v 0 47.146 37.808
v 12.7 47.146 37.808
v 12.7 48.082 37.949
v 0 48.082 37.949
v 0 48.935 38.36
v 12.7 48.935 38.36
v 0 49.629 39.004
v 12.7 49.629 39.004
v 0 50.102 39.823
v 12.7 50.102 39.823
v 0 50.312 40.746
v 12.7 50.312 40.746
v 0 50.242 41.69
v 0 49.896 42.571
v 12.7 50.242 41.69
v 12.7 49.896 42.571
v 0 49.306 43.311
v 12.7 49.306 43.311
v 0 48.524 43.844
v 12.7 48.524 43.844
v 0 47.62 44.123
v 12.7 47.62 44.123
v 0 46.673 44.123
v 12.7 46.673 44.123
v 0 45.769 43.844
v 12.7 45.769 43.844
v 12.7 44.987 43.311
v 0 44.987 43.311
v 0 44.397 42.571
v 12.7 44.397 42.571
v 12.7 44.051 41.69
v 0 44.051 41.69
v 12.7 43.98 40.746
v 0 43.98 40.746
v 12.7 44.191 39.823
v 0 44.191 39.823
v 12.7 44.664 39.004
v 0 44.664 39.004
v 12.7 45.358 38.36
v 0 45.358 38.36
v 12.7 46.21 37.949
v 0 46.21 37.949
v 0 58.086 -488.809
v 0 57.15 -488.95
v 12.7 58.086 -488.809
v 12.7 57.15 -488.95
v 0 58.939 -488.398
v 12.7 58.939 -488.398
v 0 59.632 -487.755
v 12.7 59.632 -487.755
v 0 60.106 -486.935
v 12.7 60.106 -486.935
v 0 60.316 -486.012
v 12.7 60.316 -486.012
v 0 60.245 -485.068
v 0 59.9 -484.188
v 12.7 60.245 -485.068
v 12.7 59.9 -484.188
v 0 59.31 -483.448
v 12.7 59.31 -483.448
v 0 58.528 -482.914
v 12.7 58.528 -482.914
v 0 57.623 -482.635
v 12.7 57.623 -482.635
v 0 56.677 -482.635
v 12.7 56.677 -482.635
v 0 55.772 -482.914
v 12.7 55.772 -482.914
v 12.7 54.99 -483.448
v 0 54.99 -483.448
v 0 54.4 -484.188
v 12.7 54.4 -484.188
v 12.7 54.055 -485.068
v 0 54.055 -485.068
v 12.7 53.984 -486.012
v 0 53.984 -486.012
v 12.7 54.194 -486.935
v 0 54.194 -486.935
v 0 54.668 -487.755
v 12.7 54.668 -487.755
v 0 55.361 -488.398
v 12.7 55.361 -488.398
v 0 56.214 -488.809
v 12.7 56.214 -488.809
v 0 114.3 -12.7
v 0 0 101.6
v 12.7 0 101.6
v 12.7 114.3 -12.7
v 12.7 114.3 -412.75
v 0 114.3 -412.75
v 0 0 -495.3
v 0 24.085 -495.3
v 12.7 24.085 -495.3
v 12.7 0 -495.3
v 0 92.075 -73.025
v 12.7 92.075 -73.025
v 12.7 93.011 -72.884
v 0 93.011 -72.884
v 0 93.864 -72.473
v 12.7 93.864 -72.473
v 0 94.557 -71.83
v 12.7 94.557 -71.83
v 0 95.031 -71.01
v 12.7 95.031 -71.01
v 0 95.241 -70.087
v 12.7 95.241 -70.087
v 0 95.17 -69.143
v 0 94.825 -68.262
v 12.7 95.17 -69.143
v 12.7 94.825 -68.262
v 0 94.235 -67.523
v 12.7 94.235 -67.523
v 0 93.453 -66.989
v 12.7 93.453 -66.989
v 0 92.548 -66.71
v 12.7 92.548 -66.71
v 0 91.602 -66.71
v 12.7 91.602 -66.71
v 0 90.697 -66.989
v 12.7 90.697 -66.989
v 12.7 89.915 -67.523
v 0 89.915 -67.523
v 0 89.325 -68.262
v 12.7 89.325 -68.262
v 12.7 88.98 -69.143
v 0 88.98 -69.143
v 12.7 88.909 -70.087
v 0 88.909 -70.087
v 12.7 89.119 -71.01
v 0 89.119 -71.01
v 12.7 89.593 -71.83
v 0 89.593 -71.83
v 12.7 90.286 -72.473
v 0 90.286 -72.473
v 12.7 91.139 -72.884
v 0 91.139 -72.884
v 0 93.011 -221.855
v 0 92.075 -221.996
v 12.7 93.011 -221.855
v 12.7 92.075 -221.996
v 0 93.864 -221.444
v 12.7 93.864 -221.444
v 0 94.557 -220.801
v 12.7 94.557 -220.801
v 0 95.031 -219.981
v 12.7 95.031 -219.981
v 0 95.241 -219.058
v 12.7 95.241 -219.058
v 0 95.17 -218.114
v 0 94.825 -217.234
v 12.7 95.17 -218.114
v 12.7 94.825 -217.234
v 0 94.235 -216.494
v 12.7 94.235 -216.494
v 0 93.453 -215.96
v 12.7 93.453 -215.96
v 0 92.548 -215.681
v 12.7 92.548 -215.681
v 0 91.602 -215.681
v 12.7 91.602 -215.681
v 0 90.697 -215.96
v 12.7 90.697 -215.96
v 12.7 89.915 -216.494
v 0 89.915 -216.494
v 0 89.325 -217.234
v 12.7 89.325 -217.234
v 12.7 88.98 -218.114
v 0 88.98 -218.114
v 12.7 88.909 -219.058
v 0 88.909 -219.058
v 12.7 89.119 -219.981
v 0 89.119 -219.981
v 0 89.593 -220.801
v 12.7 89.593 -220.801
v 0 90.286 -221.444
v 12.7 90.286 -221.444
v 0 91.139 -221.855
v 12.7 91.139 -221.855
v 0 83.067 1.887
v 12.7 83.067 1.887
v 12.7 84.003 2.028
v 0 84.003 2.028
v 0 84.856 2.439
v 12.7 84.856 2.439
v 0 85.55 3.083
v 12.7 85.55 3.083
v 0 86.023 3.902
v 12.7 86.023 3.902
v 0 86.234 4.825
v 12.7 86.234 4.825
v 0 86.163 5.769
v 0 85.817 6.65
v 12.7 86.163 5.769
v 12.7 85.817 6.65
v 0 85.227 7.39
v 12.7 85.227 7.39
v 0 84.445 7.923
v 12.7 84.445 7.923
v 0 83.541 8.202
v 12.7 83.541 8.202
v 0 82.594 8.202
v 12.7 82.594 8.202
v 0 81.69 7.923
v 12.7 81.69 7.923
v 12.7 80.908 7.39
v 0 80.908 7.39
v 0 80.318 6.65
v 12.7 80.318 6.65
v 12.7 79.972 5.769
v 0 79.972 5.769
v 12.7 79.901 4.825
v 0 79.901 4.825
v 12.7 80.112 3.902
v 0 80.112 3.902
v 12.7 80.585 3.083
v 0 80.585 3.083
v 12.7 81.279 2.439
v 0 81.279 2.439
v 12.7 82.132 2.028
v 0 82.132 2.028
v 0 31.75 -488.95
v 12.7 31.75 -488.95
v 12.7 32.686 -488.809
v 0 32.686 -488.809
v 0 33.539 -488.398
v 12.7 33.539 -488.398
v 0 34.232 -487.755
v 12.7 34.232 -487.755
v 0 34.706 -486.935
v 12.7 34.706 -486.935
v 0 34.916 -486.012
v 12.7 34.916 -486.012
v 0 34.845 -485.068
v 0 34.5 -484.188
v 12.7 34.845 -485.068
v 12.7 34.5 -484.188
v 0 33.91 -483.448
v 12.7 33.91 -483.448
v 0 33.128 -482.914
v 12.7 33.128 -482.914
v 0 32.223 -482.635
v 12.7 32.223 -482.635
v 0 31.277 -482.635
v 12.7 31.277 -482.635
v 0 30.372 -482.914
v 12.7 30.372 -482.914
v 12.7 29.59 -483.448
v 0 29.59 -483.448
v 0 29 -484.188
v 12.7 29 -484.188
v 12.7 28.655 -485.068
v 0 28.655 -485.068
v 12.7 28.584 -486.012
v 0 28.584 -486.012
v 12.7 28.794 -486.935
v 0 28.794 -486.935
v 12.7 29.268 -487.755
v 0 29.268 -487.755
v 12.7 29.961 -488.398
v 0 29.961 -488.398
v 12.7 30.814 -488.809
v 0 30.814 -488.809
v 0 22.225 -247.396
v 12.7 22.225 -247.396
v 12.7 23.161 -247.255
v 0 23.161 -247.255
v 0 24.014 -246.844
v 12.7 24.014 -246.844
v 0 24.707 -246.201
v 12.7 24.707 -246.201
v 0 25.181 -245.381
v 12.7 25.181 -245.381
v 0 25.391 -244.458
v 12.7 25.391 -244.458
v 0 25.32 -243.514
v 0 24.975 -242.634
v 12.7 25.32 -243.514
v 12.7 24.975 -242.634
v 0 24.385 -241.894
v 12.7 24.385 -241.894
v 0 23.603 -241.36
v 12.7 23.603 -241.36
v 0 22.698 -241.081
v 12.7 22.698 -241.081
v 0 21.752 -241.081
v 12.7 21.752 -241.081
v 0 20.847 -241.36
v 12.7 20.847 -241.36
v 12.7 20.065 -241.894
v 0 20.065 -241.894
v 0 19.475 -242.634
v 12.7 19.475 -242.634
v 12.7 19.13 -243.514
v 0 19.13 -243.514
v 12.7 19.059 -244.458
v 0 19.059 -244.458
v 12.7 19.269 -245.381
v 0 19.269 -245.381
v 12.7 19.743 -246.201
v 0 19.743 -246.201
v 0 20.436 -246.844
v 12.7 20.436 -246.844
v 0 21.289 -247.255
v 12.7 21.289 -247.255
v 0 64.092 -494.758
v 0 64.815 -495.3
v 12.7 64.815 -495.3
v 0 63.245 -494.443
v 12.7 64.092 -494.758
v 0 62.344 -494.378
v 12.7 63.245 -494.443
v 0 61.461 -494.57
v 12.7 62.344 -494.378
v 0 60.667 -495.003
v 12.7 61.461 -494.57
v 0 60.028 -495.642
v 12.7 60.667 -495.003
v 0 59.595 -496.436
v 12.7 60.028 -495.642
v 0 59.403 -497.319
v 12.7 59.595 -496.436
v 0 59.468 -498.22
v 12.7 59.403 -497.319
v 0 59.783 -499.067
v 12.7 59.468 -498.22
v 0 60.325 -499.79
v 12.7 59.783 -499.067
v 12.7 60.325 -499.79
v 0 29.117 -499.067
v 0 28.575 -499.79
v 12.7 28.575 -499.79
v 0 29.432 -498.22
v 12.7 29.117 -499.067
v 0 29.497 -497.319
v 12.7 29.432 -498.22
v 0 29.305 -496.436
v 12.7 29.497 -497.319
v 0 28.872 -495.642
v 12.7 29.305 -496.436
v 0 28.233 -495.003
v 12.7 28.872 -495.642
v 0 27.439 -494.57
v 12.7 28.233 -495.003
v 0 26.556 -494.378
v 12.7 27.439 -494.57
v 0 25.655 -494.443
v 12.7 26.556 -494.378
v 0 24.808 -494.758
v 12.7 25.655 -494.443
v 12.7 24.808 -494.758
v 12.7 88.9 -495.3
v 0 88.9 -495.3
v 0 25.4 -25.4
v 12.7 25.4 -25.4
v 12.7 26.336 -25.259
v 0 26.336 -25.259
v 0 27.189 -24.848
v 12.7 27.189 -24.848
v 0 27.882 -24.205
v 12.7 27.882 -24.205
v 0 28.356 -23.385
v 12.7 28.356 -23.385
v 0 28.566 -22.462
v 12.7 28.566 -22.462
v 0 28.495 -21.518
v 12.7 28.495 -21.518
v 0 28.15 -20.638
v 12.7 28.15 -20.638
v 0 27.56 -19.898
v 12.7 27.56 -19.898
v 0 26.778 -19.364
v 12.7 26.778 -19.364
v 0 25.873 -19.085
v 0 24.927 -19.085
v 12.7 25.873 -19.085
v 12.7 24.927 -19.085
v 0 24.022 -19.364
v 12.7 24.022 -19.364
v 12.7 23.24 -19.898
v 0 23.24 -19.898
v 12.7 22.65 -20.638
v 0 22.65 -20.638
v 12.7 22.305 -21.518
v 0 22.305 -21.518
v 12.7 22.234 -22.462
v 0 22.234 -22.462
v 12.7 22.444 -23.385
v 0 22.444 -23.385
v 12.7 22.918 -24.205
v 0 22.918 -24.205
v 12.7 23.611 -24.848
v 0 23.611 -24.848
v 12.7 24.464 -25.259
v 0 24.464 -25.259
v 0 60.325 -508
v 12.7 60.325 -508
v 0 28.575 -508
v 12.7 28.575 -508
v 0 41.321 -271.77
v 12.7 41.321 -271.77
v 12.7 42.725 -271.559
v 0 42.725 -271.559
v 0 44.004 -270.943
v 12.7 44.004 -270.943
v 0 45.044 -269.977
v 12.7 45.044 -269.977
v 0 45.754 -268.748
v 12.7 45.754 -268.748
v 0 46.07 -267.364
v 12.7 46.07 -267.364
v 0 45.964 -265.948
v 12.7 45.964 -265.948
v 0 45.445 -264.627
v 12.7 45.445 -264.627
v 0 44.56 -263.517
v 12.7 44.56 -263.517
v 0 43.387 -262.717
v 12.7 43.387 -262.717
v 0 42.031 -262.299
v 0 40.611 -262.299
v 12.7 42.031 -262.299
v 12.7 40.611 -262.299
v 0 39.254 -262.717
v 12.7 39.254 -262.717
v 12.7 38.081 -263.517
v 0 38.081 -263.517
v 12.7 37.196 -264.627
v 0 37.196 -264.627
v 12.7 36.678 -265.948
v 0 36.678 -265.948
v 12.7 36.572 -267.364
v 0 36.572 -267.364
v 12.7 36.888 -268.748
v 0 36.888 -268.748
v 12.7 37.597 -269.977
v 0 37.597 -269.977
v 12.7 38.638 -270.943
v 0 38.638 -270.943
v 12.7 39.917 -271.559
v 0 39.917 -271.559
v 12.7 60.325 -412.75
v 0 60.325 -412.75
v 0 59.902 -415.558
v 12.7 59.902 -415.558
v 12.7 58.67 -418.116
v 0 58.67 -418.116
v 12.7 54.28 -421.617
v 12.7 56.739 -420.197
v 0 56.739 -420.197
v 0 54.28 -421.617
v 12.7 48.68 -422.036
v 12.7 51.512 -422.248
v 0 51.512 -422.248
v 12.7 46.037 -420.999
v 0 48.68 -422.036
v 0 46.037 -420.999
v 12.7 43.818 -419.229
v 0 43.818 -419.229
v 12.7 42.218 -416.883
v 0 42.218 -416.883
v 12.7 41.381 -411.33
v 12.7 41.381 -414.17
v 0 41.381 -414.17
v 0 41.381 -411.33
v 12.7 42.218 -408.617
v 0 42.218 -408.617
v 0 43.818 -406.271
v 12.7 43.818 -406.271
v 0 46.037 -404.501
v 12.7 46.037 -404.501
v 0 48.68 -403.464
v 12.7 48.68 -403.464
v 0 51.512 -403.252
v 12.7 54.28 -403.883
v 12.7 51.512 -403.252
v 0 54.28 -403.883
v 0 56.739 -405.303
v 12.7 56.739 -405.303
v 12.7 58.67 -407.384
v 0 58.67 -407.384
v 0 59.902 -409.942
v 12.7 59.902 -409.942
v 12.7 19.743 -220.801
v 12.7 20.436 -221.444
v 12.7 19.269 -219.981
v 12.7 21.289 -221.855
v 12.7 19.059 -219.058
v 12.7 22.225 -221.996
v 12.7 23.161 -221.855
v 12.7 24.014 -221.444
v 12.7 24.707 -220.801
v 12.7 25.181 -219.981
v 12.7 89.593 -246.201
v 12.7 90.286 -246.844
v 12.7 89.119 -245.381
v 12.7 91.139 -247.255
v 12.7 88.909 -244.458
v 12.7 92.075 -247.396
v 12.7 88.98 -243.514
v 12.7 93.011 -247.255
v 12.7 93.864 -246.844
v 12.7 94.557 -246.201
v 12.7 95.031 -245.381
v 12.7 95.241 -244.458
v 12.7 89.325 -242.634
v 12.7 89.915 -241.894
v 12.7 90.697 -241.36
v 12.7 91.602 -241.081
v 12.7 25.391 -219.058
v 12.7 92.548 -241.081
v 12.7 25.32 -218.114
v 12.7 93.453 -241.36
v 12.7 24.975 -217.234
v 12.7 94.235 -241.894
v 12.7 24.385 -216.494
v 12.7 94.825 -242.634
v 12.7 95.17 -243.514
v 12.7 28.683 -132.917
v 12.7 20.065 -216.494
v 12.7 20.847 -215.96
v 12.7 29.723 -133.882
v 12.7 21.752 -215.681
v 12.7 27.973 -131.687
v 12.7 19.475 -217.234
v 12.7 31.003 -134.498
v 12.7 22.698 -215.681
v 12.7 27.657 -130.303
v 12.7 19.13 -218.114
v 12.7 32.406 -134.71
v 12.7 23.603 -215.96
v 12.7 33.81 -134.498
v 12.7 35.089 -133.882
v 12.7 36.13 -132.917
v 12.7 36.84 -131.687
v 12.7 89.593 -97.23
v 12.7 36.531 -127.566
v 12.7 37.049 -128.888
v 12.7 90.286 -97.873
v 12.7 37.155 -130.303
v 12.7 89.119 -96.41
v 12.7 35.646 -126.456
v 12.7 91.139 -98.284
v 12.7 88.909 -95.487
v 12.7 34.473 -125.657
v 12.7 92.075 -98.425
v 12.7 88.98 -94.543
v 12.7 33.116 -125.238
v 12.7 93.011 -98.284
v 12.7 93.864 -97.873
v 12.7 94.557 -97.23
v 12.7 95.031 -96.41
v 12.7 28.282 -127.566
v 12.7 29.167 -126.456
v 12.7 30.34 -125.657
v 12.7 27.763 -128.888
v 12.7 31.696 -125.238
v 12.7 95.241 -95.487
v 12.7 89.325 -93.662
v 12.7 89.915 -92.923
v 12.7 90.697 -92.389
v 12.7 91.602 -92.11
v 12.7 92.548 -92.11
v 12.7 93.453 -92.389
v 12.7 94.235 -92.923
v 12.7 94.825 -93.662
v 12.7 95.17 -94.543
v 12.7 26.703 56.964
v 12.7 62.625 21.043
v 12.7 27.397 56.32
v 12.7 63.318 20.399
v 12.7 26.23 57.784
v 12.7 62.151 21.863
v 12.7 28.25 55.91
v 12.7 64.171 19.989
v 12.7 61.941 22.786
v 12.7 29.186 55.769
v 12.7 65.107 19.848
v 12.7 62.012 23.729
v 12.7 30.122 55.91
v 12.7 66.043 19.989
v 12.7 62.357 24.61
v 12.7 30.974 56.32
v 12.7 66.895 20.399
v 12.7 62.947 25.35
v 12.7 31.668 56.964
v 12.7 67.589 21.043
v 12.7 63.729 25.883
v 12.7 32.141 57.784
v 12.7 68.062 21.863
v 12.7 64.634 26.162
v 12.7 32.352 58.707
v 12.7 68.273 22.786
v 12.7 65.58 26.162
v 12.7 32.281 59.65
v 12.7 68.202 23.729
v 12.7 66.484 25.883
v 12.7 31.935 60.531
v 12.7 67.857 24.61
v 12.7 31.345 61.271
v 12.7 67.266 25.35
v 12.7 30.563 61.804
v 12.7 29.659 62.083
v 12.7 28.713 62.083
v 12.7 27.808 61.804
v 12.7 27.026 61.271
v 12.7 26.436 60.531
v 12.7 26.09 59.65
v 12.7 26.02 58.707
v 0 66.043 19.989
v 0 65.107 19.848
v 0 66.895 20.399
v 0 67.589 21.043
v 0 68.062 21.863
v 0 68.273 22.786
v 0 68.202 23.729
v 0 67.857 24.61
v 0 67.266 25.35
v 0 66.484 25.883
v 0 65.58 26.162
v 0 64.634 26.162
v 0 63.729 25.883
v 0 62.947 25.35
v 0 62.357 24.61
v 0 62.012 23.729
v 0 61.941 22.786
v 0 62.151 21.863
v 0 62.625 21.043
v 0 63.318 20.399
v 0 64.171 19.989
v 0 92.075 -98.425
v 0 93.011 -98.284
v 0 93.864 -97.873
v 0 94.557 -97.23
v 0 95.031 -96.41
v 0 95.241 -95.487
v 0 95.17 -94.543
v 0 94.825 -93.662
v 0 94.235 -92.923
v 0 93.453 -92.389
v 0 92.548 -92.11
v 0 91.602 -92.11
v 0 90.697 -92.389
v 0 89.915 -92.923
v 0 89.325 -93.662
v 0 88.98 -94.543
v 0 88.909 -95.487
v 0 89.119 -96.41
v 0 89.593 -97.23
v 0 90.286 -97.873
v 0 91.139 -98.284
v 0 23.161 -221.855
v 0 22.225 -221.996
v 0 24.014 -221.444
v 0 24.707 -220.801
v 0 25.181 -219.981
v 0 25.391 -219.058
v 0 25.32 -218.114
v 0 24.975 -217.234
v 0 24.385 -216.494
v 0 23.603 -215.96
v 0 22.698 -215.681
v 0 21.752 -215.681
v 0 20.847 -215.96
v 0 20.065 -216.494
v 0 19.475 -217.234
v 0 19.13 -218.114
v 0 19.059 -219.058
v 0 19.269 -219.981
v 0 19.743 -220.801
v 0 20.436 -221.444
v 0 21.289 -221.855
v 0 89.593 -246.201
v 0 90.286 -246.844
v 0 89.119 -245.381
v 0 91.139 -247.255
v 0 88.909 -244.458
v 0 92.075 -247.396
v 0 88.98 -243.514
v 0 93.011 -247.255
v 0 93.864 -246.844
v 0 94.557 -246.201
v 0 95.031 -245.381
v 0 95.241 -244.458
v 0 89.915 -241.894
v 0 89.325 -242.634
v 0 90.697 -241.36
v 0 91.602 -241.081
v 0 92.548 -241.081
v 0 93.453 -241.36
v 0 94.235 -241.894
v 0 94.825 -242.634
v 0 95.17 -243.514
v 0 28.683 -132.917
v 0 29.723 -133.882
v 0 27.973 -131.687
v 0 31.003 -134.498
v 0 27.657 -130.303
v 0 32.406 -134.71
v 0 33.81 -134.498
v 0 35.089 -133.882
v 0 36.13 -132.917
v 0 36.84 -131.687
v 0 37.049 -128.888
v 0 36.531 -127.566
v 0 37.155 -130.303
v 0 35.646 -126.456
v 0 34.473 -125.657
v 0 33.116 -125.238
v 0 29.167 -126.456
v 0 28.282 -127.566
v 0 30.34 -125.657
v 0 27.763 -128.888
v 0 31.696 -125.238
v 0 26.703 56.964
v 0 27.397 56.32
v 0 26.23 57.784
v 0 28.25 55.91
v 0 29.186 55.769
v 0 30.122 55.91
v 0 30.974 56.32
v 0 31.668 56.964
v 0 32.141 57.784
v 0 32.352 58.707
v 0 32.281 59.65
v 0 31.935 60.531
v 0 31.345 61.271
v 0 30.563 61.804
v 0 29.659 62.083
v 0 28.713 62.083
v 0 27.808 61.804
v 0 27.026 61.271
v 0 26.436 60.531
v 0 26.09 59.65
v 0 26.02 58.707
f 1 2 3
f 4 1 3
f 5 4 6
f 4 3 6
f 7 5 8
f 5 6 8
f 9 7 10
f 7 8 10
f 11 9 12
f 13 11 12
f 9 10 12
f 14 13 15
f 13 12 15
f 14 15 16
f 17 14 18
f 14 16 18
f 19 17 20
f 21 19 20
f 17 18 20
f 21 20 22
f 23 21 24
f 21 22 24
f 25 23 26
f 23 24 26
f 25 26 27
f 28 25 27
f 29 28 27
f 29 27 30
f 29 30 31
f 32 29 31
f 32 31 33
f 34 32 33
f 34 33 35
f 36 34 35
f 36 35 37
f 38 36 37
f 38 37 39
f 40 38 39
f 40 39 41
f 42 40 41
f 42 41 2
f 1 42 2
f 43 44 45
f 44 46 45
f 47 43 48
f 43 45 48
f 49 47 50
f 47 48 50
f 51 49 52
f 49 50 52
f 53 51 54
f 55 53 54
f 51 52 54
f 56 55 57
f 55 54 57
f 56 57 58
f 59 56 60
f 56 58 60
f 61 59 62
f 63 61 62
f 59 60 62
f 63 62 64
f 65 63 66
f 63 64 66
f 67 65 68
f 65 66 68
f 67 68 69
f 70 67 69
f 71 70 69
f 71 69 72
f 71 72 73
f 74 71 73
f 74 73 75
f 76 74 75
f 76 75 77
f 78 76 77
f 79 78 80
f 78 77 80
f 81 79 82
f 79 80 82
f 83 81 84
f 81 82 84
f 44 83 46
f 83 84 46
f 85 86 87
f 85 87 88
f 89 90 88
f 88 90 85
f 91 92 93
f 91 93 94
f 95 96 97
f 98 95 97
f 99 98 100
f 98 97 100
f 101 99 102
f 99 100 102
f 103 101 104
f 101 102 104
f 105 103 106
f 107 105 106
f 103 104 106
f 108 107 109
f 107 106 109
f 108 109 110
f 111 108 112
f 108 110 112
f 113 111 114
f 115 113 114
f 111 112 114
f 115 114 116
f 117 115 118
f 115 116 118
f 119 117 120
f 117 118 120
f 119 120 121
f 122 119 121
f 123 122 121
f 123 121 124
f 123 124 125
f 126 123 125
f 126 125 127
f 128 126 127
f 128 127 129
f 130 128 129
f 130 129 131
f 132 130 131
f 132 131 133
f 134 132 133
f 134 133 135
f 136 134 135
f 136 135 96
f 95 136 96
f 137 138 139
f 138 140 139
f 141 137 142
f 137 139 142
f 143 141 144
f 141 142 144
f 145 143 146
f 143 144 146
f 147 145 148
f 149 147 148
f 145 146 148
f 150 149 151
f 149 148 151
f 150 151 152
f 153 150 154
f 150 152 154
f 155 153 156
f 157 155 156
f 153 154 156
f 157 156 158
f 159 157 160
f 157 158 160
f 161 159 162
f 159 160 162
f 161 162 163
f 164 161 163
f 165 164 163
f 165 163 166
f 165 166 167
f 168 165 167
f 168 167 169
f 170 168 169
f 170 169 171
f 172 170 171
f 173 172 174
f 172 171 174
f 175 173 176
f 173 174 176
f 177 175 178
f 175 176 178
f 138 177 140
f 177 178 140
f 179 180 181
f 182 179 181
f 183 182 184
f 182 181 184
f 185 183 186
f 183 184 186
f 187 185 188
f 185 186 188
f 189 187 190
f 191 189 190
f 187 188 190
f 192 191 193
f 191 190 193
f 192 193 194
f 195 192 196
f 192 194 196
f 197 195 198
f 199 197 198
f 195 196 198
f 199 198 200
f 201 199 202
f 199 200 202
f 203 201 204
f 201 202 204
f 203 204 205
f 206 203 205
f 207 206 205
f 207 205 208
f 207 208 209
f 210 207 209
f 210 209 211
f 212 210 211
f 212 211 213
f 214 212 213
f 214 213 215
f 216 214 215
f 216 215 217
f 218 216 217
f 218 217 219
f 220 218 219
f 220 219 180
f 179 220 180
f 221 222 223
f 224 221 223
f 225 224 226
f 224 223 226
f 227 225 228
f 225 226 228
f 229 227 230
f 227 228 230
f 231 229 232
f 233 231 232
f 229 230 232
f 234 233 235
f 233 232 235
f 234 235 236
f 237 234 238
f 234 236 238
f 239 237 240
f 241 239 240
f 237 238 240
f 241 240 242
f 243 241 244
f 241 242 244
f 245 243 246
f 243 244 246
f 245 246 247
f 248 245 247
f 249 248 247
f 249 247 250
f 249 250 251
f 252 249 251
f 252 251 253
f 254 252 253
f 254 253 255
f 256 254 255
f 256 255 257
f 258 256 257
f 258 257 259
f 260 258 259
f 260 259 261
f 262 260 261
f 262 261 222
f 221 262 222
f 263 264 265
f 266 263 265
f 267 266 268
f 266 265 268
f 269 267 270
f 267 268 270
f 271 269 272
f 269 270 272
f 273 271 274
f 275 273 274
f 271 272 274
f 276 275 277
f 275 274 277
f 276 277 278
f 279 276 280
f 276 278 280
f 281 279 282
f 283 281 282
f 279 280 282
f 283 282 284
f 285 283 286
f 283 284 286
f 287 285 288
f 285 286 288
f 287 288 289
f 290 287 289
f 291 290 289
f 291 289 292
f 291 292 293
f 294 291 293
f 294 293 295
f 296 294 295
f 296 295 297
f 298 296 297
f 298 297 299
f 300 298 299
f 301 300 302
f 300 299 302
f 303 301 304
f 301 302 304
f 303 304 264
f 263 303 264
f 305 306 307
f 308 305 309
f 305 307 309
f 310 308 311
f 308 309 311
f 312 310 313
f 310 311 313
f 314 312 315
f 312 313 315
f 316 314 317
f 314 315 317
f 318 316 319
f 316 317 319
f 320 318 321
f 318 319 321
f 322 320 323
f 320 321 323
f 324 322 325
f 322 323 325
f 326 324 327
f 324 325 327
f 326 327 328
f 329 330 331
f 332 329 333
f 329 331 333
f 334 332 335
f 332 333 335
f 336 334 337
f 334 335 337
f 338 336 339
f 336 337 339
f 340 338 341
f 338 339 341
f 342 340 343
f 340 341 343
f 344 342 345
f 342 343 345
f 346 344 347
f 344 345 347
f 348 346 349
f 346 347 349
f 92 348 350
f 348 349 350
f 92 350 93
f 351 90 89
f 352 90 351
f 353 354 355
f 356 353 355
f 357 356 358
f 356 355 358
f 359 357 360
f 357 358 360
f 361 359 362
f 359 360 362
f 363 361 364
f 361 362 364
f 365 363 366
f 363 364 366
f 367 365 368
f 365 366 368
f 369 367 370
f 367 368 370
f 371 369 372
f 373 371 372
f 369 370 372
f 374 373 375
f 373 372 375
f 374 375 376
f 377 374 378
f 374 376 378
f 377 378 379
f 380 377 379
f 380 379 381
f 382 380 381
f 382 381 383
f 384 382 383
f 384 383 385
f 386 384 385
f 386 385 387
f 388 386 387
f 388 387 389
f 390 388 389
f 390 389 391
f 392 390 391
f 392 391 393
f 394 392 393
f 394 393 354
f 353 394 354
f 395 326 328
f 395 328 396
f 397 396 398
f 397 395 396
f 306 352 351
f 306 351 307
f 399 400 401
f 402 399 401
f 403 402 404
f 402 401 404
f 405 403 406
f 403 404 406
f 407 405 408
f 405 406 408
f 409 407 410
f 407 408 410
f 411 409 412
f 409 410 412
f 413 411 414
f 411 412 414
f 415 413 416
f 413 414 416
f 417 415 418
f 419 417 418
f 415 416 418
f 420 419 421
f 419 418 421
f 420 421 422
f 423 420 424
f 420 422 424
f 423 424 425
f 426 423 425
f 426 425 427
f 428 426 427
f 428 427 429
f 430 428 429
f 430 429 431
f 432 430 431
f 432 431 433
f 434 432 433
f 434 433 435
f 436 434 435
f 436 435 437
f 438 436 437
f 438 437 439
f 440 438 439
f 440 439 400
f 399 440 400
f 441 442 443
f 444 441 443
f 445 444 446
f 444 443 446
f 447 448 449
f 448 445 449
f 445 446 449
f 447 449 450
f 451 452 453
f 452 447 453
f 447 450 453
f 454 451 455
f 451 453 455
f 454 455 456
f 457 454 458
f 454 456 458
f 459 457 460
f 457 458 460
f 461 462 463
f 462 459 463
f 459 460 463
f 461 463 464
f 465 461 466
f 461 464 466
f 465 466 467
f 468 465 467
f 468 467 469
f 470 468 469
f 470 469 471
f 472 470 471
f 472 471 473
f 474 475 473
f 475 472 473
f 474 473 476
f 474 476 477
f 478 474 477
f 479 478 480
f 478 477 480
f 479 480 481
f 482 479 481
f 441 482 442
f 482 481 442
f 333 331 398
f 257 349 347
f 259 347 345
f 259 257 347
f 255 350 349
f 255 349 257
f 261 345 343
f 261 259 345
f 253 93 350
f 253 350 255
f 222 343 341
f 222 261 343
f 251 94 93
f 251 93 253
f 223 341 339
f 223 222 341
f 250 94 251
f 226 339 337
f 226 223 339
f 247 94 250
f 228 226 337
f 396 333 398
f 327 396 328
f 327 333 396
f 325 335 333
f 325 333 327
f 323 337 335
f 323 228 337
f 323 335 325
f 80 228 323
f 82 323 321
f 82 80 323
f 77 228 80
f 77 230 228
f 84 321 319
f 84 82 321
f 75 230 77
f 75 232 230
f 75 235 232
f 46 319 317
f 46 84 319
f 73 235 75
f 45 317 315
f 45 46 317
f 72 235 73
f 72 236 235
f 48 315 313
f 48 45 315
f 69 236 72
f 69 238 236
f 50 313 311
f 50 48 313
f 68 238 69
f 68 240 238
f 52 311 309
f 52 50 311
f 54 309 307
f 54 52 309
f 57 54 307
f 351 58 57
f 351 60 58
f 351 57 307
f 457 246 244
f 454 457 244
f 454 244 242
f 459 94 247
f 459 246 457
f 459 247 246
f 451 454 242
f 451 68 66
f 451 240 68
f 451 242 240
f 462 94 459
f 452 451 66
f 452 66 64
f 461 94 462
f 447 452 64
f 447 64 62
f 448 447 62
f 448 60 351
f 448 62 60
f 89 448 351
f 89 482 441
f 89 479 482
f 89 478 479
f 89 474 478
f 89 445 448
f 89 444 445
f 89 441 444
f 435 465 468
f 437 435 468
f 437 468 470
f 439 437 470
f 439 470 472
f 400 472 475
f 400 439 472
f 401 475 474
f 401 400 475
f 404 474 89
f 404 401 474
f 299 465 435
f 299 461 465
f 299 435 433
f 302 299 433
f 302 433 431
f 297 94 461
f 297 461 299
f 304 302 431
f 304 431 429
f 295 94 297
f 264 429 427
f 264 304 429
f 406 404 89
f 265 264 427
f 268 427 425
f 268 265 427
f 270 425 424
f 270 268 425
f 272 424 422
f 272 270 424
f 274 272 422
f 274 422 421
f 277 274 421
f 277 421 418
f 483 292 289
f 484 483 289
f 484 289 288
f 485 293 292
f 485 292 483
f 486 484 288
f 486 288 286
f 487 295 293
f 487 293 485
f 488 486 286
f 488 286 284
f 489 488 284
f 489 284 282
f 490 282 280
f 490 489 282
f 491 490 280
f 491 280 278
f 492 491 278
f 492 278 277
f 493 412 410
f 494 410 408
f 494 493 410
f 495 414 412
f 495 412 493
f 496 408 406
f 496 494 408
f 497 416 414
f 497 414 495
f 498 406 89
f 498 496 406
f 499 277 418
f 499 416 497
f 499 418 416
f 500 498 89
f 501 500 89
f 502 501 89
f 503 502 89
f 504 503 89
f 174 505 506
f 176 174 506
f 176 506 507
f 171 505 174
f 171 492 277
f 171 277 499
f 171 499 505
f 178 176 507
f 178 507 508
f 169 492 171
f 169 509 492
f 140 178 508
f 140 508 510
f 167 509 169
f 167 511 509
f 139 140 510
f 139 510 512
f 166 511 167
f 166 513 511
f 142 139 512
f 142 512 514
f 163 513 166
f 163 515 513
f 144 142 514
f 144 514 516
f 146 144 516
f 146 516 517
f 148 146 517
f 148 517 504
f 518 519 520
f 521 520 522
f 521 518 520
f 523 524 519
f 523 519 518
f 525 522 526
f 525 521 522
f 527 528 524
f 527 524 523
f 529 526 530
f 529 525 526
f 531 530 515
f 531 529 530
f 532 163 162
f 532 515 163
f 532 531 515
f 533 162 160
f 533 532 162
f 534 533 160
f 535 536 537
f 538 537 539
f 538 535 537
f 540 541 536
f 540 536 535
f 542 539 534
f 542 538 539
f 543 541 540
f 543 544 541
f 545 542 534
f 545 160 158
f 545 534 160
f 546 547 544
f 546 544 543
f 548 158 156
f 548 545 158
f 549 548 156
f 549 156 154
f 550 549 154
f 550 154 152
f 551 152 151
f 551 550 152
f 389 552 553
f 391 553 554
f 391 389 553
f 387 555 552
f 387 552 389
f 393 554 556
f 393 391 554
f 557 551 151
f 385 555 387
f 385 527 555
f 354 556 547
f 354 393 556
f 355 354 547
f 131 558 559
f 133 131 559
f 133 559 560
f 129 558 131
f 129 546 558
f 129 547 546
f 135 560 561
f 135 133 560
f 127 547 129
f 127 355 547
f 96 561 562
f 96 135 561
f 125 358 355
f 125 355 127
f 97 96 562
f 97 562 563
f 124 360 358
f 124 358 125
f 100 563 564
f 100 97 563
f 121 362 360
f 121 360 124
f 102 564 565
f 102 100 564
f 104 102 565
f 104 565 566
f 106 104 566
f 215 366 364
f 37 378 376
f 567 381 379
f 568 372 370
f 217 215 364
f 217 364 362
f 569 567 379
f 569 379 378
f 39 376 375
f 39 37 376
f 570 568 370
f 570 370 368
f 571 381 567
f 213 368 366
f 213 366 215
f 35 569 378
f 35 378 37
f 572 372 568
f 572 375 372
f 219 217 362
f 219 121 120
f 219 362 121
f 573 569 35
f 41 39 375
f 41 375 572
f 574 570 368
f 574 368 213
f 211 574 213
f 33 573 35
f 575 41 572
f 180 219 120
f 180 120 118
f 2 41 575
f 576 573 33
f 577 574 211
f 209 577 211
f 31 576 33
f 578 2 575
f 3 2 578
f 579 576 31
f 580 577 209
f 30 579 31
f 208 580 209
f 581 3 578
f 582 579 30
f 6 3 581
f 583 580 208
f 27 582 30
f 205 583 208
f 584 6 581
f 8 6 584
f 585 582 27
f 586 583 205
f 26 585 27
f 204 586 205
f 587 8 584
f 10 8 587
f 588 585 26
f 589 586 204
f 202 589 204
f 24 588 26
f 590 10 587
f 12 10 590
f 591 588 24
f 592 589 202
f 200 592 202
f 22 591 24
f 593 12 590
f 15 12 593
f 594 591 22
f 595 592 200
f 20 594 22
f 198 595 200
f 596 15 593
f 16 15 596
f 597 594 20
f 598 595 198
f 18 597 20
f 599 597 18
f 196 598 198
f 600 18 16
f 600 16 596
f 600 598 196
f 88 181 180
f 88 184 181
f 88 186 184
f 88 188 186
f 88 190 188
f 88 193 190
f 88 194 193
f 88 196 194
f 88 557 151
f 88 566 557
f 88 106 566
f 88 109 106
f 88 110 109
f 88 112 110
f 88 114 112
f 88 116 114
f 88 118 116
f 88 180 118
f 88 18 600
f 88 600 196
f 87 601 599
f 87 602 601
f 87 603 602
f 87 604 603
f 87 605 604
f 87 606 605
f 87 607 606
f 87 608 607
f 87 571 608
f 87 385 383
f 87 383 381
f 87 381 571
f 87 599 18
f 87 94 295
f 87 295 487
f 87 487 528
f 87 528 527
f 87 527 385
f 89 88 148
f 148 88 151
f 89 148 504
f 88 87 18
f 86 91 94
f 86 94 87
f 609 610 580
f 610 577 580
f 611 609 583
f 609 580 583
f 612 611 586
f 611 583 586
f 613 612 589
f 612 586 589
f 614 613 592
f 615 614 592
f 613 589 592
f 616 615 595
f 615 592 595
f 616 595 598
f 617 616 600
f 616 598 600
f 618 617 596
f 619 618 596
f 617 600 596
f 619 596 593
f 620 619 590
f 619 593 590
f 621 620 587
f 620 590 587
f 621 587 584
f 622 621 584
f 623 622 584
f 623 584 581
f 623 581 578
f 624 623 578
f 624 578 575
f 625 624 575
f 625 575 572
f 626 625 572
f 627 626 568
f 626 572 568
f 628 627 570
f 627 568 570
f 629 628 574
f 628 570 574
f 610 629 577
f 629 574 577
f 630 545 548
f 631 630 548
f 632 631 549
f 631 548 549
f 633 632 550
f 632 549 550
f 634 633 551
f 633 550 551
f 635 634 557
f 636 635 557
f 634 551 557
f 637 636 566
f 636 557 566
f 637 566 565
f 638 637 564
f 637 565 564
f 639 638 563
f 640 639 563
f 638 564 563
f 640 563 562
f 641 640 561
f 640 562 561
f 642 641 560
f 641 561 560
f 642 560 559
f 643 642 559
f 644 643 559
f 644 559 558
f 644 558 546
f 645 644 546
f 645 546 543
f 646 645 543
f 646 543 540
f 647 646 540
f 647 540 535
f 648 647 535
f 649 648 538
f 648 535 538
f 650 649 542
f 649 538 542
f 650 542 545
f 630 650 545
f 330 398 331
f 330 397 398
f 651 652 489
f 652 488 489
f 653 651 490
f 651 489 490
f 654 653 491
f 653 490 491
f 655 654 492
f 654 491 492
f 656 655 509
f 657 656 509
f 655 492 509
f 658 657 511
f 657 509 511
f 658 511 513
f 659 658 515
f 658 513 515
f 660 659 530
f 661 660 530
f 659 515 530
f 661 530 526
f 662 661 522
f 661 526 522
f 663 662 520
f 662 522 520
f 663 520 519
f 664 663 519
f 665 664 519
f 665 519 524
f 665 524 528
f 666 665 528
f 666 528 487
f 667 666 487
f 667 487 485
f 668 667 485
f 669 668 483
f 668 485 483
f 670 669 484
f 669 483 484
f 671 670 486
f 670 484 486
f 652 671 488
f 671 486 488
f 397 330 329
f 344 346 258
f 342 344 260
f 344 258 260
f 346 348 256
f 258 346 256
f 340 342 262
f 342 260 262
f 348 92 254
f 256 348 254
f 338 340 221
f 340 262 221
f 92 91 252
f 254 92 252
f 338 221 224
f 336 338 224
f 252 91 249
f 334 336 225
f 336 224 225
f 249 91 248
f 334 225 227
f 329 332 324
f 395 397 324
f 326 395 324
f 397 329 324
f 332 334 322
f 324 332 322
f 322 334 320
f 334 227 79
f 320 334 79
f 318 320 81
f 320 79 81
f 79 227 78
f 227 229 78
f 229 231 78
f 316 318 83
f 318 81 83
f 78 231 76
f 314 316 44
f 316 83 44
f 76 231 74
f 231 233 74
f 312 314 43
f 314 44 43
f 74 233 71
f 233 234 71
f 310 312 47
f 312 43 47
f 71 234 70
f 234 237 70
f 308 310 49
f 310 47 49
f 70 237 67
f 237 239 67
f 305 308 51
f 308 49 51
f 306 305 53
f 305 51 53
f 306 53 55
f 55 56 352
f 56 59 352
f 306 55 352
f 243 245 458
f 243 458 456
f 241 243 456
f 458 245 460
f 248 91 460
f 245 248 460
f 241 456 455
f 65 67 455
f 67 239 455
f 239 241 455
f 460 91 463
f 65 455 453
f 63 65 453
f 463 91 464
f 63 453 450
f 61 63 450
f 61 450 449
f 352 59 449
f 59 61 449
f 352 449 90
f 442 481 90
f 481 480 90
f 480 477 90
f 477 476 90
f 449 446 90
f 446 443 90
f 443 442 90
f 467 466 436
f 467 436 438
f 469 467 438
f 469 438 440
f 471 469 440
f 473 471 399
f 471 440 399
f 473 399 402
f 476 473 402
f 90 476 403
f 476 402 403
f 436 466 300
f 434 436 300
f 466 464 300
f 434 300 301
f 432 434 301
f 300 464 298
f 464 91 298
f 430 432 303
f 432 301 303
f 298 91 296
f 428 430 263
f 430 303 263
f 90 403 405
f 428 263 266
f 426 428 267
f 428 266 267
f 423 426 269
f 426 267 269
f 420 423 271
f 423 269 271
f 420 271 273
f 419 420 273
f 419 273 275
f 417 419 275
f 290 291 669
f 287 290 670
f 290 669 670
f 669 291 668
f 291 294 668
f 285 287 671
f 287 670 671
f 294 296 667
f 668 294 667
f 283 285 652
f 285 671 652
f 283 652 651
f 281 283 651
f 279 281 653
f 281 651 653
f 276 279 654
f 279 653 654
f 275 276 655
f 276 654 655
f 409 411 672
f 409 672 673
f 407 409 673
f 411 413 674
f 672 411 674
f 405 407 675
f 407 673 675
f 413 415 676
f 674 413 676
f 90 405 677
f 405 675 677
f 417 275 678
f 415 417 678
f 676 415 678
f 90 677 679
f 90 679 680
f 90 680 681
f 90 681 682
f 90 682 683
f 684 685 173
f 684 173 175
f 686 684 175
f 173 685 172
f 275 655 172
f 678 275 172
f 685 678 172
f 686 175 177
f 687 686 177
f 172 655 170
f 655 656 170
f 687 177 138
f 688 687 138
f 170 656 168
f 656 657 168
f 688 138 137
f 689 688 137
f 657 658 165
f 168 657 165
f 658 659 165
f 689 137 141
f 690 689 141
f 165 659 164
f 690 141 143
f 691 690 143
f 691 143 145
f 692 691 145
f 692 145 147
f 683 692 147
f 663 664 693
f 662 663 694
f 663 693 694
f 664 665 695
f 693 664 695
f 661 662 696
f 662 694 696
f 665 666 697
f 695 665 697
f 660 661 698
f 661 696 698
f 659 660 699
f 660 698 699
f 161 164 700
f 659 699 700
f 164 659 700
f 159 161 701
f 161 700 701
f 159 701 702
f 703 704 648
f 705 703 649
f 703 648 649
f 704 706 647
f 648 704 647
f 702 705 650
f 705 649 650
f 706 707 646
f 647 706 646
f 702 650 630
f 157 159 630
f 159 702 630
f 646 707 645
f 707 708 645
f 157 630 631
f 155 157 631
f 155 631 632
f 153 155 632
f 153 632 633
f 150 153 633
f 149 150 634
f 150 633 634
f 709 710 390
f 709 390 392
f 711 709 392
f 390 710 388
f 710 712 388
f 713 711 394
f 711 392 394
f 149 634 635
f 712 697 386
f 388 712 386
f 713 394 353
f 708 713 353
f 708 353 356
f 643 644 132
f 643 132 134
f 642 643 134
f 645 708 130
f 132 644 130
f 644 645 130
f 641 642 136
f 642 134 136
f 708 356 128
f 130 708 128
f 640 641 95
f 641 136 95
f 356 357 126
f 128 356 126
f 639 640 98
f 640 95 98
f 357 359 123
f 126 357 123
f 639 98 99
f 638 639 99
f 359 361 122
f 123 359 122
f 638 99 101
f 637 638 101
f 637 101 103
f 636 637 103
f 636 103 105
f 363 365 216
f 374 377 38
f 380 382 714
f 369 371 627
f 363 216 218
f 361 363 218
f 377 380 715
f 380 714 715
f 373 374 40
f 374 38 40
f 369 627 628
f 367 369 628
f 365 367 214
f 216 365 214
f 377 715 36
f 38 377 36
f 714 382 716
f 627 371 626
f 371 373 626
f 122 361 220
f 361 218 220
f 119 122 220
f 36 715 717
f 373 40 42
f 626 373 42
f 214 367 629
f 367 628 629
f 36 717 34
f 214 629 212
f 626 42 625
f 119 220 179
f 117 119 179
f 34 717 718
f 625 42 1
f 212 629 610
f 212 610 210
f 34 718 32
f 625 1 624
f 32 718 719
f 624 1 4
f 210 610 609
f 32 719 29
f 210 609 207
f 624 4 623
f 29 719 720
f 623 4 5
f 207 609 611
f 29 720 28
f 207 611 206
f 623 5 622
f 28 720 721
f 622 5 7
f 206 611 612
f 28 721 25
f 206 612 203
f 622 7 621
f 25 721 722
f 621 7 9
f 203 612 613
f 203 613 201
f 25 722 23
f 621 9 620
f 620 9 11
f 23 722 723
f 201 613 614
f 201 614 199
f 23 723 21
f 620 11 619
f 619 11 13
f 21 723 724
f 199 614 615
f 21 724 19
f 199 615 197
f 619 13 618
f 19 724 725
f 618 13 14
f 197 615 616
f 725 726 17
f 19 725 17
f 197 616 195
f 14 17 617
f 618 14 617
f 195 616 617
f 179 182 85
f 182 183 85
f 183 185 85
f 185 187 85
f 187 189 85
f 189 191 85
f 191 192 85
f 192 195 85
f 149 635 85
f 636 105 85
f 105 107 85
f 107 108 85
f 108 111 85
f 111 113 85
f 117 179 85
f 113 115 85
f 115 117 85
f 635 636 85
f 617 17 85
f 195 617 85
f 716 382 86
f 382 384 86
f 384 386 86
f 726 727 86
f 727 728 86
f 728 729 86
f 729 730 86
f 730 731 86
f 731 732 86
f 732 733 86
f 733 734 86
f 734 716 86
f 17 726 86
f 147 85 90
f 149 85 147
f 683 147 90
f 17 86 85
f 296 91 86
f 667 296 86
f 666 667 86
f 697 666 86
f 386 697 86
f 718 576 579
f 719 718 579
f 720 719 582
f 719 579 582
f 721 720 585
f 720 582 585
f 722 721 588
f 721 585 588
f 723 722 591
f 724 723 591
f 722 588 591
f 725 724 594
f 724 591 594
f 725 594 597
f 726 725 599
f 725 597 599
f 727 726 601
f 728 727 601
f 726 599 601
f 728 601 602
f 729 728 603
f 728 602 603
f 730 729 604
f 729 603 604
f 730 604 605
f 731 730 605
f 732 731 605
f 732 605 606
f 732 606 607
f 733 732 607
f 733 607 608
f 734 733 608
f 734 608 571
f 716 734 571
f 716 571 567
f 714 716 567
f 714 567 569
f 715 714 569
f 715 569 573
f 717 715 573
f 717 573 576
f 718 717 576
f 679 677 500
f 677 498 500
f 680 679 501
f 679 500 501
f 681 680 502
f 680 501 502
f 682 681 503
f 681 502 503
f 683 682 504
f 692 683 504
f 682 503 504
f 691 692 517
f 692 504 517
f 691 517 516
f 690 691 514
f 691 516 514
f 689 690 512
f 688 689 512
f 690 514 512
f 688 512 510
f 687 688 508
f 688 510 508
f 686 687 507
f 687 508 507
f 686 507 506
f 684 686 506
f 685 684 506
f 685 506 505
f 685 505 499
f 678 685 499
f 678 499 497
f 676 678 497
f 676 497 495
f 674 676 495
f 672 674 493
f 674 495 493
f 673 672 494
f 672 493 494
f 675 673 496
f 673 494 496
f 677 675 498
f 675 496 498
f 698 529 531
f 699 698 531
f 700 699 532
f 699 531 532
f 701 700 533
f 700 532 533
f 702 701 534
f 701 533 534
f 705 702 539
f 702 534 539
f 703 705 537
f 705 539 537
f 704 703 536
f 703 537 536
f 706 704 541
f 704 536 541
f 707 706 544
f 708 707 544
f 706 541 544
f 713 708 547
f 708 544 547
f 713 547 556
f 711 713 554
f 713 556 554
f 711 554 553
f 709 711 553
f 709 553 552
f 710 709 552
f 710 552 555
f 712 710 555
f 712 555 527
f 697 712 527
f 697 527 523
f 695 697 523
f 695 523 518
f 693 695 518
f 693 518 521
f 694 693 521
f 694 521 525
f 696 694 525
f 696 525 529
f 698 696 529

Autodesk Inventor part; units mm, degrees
ref_plane "YZ Plane" through (0, 0, 0) normal (1, 0, 0) x (0, 1, 0)
ref_plane "XZ Plane" through (0, 0, 0) normal (0, 1, 0) x (-1, 0, 0)
ref_plane "XY Plane" through (0, 0, 0) normal (0, 0, 1) x (1, 0, 0)
sketch "Sketch1" plane through (0, 0, 0) normal (1, 0, 0) x (0, 1, 0)
  line L0 (0, 0) -> (101.6, 0)
  line L1 (101.6, 0) -> (101.6, -508)
  line L2 (101.6, -508) -> (0, -508)
  line L3 (0, -508) -> (0, 0)
  line L4 (0, 0) -> (0, 101.6)
  line L5 (0, 101.6) -> (101.6, 0)
  line L6 (101.6, -508) -> (114.3, -508)
  line L7 (114.3, -508) -> (114.3, -12.7)
  line L8 (114.3, -12.7) -> (101.6, -12.7)
  line L9 (101.6, -12.7) -> (101.6, -508)
  line L10 (114.3, -12.7) -> (101.6, 0)
  line L11 (0, -508) -> (28.575, -508)
  line L12 (28.575, -508) -> (28.575, -495.3)
  line L13 (28.575, -495.3) -> (0, -495.3)
  line L14 (0, -495.3) -> (0, -508)
  line L15 (60.325, -508) -> (114.3, -508)
  line L16 (114.3, -508) -> (114.3, -495.3)
  line L17 (114.3, -495.3) -> (60.325, -495.3)
  line L18 (60.325, -495.3) -> (60.325, -508)
  circle A0 centre (50.8, -412.75) radius 9.525
  line L19 (50.8, -412.75) -> (127.2366, -412.75)
  line L20 (114.3, -412.75) -> (88.9, -495.3)
  point P0 (0, -495.3)
  dimension "d0" = 508
  dimension "d1" = 101.6
  dimension "d2" = 101.6
  dimension "d3" = 12.7
  dimension "d4" = 495.3
  dimension "d5" = 28.575
  dimension "d6" = 12.7
  dimension "d7" = 31.75
  dimension "d8" = 19.05
  dimension "d9" = 95.25
  dimension "d10" = 50.8
  dimension "d11" = 28.575
  dimension "d14" = 12.7
extrude "Extrusion1" add sketch "Sketch1" along normal blind 12.7 contours L4 L5 L0 | L0 L1 L20 L17 L18 L2 L12 L13 L3 | L10 L8 L1 | L8 L7 L19 L1 | L19 L20 L1
sketch "Sketch2" plane through (12.7, 0, 0) normal (1, 0, 0) x (0, 0, -1)
  line L0 (508, 60.325) -> (495.3, 60.325) projected
  line L1 (495.3, 60.325) -> (497.5451, 62.5701)
  line L2 (495.3, 0) -> (495.3, 28.575) projected
  line L3 (495.3, 28.575) -> (497.5451, 26.3299)
  line L4 (495.3, 28.575) -> (508, 28.575) projected
  circle A0 centre (497.5451, 62.5701) radius 3.175
  circle A1 centre (497.5451, 26.3299) radius 3.175
  point P0 (0, 0)
  dimension "d15" = 3.175
  dimension "d16" = 45
  dimension "d17" = 3.175
  dimension "d18" = 45
  dimension "d19" = 6.35
  dimension "d20" = 6.35
extrude "Extrusion2" cut sketch "Sketch2" against normal blind 12.7
sketch "Sketch3" plane through (12.7, 0, 0) normal (1, 0, 0) x (0, 0, -1)
  circle A0 centre (485.775, 57.15) radius 3.175
  line L0 (495.3, 64.8151) -> (495.3, 88.9) projected
  line L1 (508, 28.575) -> (508, 60.325) projected
  circle A1 centre (485.775, 31.75) radius 3.175
  line L2 (495.3, 0) -> (495.3, 24.0849) projected
  line L3 (12.7, 114.3) -> (-101.6, 0) projected
  line L4 (-83.6395, 17.9605) -> (-29.758, 71.842)
  line L5 (-29.758, 71.842) -> (-16.2876, 58.3717)
  line L6 (-16.2876, 58.3717) -> (-70.1691, 4.4901)
  line L7 (-70.1691, 4.4901) -> (-83.6395, 17.9605)
  circle A2 centre (-58.9438, 29.1858) radius 3.175
  circle A3 centre (-40.9833, 47.1463) radius 3.175
  point P0 (0, 0)
  point P1 (508, 44.45)
  point P2 (508, 44.45)
  dimension "d23" = 6.35
  dimension "d25" = 9.525
  dimension "d27" = 12.7
  dimension "d28" = 6.35
  dimension "d29" = 9.525
  dimension "d30" = 12.7
  dimension "d31" = 19.05
  dimension "d32" = 76.2
  dimension "d33" = 25.4
  dimension "d34" = 6.35
  dimension "d35" = 6.35
  dimension "d36" = 9.525
  dimension "d37" = 9.525
  dimension "d38" = 25.4
  dimension "d39" = 25.4
extrude "Extrusion3" cut sketch "Sketch3" against normal blind 12.7 contours A0 | A1 | A2 | A3
sketch "Sketch4" plane through (12.7, 0, 0) normal (1, 0, 0) x (0, 0, -1)
  circle A0 centre (218.821, 92.075) radius 3.175
  line L0 (-101.6, 0) -> (495.3, 0) projected
  circle A1 centre (244.221, 92.075) radius 3.175
  point P0 (0, 0)
  dimension "d42" = 6.35
  dimension "d43" = 92.075
  dimension "d44" = 6.35
  dimension "d45" = 92.075
  dimension "d46" = 218.821
  dimension "d47" = 244.221
extrude "Extrusion4" cut sketch "Sketch4" against normal blind 12.7
sketch "Sketch6" plane through (12.7, 0, 0) normal (1, 0, 0) x (0, 0, -1)
  circle A0 centre (218.821, 22.225) radius 3.175
  circle A1 centre (244.221, 22.225) radius 3.175
  line L0 (-101.6, 0) -> (495.3, 0) projected
  point P0 (0, 0)
  dimension "d59" = 6.35
  dimension "d60" = 6.35
  dimension "d61" = 218.821
  dimension "d62" = 22.225
  dimension "d63" = 22.225
  dimension "d64" = 25.4
extrude "Extrusion6" cut sketch "Sketch6" against normal blind 12.7
sketch "Sketch7" plane through (12.7, 0, 0) normal (1, 0, 0) x (0, 0, -1)
  circle A0 centre (69.85, 92.075) radius 3.175
  circle A1 centre (95.25, 92.075) radius 3.175
  line L0 (412.75, 114.3) -> (12.7, 114.3) projected
  point P0 (0, 0)
  dimension "d67" = 6.35
  dimension "d68" = 6.35
  dimension "d69" = 69.85
  dimension "d70" = 22.225
  dimension "d71" = 22.225
  dimension "d72" = 25.4
extrude "Extrusion7" cut sketch "Sketch7" against normal blind 12.7
sketch "Sketch10" plane through (12.7, 0, 0) normal (1, 0, 0) x (0, 0, -1)
  circle A0 centre (22.225, 25.4) radius 3.175
  line L0 (-101.6, 0) -> (495.3, 0) projected
  circle A1 centre (412.75, 50.8) radius 9.525 projected
  circle A2 centre (412.75, 50.8) radius 76.2
  circle A3 centre (22.225, 25.4) radius 38.1
  line L1 (22.225, 25.4) -> (412.75, 50.8)
  circle A4 centre (129.9474, 32.4063) radius 4.7625
  circle A5 centre (267.0079, 41.3208) radius 4.7625
  point P0 (0, 0)
  dimension "d82" = 6.35
  dimension "d83" = 25.4
  dimension "d84" = 22.225
  dimension "d85" = 152.4
  dimension "d86" = 76.2
  dimension "d87" = 9.525
  dimension "d88" = 107.95
  dimension "d89" = 9.525
  dimension "d90" = 146.05
extrude "Extrusion8" cut sketch "Sketch10" against normal blind 12.7 contours A0 | A4 L1 | L1 A4 | A5 L1 | L1 A5
sketch "Sketch15" plane through (12.7, 0, 0) normal (1, 0, 0) x (0, 0, -1)
  circle A0 centre (-23.0228, 65.1069) radius 3.175
  line L0 (12.7, 114.3) -> (-101.6, 0) projected
  circle A1 centre (-40.9833, 47.1463) radius 3.175 projected
  circle A2 centre (-5.0622, 83.0674) radius 3.175
  line L1 (-74.6592, 26.9408) -> (-2.8172, 98.7828)
  line L2 (-2.8172, 98.7828) -> (10.6532, 85.3124)
  line L3 (10.6532, 85.3124) -> (-61.1888, 13.4704)
  line L4 (-61.1888, 13.4704) -> (-74.6592, 26.9408)
  circle A3 centre (-58.9438, 29.1858) radius 3.175 projected
  point P0 (0, 0)
  dimension "d103" = 6.35
  dimension "d104" = 9.525
  dimension "d105" = 25.4
  dimension "d106" = 6.35
  dimension "d107" = 9.525
  dimension "d108" = 25.4
  dimension "d109" = 19.05
  dimension "d110" = 12.7
  dimension "d111" = 101.6
extrude "Extrusion11" cut sketch "Sketch15" against normal blind 12.7 contours A0 | A2
properties part number "Side Wall_outer"
